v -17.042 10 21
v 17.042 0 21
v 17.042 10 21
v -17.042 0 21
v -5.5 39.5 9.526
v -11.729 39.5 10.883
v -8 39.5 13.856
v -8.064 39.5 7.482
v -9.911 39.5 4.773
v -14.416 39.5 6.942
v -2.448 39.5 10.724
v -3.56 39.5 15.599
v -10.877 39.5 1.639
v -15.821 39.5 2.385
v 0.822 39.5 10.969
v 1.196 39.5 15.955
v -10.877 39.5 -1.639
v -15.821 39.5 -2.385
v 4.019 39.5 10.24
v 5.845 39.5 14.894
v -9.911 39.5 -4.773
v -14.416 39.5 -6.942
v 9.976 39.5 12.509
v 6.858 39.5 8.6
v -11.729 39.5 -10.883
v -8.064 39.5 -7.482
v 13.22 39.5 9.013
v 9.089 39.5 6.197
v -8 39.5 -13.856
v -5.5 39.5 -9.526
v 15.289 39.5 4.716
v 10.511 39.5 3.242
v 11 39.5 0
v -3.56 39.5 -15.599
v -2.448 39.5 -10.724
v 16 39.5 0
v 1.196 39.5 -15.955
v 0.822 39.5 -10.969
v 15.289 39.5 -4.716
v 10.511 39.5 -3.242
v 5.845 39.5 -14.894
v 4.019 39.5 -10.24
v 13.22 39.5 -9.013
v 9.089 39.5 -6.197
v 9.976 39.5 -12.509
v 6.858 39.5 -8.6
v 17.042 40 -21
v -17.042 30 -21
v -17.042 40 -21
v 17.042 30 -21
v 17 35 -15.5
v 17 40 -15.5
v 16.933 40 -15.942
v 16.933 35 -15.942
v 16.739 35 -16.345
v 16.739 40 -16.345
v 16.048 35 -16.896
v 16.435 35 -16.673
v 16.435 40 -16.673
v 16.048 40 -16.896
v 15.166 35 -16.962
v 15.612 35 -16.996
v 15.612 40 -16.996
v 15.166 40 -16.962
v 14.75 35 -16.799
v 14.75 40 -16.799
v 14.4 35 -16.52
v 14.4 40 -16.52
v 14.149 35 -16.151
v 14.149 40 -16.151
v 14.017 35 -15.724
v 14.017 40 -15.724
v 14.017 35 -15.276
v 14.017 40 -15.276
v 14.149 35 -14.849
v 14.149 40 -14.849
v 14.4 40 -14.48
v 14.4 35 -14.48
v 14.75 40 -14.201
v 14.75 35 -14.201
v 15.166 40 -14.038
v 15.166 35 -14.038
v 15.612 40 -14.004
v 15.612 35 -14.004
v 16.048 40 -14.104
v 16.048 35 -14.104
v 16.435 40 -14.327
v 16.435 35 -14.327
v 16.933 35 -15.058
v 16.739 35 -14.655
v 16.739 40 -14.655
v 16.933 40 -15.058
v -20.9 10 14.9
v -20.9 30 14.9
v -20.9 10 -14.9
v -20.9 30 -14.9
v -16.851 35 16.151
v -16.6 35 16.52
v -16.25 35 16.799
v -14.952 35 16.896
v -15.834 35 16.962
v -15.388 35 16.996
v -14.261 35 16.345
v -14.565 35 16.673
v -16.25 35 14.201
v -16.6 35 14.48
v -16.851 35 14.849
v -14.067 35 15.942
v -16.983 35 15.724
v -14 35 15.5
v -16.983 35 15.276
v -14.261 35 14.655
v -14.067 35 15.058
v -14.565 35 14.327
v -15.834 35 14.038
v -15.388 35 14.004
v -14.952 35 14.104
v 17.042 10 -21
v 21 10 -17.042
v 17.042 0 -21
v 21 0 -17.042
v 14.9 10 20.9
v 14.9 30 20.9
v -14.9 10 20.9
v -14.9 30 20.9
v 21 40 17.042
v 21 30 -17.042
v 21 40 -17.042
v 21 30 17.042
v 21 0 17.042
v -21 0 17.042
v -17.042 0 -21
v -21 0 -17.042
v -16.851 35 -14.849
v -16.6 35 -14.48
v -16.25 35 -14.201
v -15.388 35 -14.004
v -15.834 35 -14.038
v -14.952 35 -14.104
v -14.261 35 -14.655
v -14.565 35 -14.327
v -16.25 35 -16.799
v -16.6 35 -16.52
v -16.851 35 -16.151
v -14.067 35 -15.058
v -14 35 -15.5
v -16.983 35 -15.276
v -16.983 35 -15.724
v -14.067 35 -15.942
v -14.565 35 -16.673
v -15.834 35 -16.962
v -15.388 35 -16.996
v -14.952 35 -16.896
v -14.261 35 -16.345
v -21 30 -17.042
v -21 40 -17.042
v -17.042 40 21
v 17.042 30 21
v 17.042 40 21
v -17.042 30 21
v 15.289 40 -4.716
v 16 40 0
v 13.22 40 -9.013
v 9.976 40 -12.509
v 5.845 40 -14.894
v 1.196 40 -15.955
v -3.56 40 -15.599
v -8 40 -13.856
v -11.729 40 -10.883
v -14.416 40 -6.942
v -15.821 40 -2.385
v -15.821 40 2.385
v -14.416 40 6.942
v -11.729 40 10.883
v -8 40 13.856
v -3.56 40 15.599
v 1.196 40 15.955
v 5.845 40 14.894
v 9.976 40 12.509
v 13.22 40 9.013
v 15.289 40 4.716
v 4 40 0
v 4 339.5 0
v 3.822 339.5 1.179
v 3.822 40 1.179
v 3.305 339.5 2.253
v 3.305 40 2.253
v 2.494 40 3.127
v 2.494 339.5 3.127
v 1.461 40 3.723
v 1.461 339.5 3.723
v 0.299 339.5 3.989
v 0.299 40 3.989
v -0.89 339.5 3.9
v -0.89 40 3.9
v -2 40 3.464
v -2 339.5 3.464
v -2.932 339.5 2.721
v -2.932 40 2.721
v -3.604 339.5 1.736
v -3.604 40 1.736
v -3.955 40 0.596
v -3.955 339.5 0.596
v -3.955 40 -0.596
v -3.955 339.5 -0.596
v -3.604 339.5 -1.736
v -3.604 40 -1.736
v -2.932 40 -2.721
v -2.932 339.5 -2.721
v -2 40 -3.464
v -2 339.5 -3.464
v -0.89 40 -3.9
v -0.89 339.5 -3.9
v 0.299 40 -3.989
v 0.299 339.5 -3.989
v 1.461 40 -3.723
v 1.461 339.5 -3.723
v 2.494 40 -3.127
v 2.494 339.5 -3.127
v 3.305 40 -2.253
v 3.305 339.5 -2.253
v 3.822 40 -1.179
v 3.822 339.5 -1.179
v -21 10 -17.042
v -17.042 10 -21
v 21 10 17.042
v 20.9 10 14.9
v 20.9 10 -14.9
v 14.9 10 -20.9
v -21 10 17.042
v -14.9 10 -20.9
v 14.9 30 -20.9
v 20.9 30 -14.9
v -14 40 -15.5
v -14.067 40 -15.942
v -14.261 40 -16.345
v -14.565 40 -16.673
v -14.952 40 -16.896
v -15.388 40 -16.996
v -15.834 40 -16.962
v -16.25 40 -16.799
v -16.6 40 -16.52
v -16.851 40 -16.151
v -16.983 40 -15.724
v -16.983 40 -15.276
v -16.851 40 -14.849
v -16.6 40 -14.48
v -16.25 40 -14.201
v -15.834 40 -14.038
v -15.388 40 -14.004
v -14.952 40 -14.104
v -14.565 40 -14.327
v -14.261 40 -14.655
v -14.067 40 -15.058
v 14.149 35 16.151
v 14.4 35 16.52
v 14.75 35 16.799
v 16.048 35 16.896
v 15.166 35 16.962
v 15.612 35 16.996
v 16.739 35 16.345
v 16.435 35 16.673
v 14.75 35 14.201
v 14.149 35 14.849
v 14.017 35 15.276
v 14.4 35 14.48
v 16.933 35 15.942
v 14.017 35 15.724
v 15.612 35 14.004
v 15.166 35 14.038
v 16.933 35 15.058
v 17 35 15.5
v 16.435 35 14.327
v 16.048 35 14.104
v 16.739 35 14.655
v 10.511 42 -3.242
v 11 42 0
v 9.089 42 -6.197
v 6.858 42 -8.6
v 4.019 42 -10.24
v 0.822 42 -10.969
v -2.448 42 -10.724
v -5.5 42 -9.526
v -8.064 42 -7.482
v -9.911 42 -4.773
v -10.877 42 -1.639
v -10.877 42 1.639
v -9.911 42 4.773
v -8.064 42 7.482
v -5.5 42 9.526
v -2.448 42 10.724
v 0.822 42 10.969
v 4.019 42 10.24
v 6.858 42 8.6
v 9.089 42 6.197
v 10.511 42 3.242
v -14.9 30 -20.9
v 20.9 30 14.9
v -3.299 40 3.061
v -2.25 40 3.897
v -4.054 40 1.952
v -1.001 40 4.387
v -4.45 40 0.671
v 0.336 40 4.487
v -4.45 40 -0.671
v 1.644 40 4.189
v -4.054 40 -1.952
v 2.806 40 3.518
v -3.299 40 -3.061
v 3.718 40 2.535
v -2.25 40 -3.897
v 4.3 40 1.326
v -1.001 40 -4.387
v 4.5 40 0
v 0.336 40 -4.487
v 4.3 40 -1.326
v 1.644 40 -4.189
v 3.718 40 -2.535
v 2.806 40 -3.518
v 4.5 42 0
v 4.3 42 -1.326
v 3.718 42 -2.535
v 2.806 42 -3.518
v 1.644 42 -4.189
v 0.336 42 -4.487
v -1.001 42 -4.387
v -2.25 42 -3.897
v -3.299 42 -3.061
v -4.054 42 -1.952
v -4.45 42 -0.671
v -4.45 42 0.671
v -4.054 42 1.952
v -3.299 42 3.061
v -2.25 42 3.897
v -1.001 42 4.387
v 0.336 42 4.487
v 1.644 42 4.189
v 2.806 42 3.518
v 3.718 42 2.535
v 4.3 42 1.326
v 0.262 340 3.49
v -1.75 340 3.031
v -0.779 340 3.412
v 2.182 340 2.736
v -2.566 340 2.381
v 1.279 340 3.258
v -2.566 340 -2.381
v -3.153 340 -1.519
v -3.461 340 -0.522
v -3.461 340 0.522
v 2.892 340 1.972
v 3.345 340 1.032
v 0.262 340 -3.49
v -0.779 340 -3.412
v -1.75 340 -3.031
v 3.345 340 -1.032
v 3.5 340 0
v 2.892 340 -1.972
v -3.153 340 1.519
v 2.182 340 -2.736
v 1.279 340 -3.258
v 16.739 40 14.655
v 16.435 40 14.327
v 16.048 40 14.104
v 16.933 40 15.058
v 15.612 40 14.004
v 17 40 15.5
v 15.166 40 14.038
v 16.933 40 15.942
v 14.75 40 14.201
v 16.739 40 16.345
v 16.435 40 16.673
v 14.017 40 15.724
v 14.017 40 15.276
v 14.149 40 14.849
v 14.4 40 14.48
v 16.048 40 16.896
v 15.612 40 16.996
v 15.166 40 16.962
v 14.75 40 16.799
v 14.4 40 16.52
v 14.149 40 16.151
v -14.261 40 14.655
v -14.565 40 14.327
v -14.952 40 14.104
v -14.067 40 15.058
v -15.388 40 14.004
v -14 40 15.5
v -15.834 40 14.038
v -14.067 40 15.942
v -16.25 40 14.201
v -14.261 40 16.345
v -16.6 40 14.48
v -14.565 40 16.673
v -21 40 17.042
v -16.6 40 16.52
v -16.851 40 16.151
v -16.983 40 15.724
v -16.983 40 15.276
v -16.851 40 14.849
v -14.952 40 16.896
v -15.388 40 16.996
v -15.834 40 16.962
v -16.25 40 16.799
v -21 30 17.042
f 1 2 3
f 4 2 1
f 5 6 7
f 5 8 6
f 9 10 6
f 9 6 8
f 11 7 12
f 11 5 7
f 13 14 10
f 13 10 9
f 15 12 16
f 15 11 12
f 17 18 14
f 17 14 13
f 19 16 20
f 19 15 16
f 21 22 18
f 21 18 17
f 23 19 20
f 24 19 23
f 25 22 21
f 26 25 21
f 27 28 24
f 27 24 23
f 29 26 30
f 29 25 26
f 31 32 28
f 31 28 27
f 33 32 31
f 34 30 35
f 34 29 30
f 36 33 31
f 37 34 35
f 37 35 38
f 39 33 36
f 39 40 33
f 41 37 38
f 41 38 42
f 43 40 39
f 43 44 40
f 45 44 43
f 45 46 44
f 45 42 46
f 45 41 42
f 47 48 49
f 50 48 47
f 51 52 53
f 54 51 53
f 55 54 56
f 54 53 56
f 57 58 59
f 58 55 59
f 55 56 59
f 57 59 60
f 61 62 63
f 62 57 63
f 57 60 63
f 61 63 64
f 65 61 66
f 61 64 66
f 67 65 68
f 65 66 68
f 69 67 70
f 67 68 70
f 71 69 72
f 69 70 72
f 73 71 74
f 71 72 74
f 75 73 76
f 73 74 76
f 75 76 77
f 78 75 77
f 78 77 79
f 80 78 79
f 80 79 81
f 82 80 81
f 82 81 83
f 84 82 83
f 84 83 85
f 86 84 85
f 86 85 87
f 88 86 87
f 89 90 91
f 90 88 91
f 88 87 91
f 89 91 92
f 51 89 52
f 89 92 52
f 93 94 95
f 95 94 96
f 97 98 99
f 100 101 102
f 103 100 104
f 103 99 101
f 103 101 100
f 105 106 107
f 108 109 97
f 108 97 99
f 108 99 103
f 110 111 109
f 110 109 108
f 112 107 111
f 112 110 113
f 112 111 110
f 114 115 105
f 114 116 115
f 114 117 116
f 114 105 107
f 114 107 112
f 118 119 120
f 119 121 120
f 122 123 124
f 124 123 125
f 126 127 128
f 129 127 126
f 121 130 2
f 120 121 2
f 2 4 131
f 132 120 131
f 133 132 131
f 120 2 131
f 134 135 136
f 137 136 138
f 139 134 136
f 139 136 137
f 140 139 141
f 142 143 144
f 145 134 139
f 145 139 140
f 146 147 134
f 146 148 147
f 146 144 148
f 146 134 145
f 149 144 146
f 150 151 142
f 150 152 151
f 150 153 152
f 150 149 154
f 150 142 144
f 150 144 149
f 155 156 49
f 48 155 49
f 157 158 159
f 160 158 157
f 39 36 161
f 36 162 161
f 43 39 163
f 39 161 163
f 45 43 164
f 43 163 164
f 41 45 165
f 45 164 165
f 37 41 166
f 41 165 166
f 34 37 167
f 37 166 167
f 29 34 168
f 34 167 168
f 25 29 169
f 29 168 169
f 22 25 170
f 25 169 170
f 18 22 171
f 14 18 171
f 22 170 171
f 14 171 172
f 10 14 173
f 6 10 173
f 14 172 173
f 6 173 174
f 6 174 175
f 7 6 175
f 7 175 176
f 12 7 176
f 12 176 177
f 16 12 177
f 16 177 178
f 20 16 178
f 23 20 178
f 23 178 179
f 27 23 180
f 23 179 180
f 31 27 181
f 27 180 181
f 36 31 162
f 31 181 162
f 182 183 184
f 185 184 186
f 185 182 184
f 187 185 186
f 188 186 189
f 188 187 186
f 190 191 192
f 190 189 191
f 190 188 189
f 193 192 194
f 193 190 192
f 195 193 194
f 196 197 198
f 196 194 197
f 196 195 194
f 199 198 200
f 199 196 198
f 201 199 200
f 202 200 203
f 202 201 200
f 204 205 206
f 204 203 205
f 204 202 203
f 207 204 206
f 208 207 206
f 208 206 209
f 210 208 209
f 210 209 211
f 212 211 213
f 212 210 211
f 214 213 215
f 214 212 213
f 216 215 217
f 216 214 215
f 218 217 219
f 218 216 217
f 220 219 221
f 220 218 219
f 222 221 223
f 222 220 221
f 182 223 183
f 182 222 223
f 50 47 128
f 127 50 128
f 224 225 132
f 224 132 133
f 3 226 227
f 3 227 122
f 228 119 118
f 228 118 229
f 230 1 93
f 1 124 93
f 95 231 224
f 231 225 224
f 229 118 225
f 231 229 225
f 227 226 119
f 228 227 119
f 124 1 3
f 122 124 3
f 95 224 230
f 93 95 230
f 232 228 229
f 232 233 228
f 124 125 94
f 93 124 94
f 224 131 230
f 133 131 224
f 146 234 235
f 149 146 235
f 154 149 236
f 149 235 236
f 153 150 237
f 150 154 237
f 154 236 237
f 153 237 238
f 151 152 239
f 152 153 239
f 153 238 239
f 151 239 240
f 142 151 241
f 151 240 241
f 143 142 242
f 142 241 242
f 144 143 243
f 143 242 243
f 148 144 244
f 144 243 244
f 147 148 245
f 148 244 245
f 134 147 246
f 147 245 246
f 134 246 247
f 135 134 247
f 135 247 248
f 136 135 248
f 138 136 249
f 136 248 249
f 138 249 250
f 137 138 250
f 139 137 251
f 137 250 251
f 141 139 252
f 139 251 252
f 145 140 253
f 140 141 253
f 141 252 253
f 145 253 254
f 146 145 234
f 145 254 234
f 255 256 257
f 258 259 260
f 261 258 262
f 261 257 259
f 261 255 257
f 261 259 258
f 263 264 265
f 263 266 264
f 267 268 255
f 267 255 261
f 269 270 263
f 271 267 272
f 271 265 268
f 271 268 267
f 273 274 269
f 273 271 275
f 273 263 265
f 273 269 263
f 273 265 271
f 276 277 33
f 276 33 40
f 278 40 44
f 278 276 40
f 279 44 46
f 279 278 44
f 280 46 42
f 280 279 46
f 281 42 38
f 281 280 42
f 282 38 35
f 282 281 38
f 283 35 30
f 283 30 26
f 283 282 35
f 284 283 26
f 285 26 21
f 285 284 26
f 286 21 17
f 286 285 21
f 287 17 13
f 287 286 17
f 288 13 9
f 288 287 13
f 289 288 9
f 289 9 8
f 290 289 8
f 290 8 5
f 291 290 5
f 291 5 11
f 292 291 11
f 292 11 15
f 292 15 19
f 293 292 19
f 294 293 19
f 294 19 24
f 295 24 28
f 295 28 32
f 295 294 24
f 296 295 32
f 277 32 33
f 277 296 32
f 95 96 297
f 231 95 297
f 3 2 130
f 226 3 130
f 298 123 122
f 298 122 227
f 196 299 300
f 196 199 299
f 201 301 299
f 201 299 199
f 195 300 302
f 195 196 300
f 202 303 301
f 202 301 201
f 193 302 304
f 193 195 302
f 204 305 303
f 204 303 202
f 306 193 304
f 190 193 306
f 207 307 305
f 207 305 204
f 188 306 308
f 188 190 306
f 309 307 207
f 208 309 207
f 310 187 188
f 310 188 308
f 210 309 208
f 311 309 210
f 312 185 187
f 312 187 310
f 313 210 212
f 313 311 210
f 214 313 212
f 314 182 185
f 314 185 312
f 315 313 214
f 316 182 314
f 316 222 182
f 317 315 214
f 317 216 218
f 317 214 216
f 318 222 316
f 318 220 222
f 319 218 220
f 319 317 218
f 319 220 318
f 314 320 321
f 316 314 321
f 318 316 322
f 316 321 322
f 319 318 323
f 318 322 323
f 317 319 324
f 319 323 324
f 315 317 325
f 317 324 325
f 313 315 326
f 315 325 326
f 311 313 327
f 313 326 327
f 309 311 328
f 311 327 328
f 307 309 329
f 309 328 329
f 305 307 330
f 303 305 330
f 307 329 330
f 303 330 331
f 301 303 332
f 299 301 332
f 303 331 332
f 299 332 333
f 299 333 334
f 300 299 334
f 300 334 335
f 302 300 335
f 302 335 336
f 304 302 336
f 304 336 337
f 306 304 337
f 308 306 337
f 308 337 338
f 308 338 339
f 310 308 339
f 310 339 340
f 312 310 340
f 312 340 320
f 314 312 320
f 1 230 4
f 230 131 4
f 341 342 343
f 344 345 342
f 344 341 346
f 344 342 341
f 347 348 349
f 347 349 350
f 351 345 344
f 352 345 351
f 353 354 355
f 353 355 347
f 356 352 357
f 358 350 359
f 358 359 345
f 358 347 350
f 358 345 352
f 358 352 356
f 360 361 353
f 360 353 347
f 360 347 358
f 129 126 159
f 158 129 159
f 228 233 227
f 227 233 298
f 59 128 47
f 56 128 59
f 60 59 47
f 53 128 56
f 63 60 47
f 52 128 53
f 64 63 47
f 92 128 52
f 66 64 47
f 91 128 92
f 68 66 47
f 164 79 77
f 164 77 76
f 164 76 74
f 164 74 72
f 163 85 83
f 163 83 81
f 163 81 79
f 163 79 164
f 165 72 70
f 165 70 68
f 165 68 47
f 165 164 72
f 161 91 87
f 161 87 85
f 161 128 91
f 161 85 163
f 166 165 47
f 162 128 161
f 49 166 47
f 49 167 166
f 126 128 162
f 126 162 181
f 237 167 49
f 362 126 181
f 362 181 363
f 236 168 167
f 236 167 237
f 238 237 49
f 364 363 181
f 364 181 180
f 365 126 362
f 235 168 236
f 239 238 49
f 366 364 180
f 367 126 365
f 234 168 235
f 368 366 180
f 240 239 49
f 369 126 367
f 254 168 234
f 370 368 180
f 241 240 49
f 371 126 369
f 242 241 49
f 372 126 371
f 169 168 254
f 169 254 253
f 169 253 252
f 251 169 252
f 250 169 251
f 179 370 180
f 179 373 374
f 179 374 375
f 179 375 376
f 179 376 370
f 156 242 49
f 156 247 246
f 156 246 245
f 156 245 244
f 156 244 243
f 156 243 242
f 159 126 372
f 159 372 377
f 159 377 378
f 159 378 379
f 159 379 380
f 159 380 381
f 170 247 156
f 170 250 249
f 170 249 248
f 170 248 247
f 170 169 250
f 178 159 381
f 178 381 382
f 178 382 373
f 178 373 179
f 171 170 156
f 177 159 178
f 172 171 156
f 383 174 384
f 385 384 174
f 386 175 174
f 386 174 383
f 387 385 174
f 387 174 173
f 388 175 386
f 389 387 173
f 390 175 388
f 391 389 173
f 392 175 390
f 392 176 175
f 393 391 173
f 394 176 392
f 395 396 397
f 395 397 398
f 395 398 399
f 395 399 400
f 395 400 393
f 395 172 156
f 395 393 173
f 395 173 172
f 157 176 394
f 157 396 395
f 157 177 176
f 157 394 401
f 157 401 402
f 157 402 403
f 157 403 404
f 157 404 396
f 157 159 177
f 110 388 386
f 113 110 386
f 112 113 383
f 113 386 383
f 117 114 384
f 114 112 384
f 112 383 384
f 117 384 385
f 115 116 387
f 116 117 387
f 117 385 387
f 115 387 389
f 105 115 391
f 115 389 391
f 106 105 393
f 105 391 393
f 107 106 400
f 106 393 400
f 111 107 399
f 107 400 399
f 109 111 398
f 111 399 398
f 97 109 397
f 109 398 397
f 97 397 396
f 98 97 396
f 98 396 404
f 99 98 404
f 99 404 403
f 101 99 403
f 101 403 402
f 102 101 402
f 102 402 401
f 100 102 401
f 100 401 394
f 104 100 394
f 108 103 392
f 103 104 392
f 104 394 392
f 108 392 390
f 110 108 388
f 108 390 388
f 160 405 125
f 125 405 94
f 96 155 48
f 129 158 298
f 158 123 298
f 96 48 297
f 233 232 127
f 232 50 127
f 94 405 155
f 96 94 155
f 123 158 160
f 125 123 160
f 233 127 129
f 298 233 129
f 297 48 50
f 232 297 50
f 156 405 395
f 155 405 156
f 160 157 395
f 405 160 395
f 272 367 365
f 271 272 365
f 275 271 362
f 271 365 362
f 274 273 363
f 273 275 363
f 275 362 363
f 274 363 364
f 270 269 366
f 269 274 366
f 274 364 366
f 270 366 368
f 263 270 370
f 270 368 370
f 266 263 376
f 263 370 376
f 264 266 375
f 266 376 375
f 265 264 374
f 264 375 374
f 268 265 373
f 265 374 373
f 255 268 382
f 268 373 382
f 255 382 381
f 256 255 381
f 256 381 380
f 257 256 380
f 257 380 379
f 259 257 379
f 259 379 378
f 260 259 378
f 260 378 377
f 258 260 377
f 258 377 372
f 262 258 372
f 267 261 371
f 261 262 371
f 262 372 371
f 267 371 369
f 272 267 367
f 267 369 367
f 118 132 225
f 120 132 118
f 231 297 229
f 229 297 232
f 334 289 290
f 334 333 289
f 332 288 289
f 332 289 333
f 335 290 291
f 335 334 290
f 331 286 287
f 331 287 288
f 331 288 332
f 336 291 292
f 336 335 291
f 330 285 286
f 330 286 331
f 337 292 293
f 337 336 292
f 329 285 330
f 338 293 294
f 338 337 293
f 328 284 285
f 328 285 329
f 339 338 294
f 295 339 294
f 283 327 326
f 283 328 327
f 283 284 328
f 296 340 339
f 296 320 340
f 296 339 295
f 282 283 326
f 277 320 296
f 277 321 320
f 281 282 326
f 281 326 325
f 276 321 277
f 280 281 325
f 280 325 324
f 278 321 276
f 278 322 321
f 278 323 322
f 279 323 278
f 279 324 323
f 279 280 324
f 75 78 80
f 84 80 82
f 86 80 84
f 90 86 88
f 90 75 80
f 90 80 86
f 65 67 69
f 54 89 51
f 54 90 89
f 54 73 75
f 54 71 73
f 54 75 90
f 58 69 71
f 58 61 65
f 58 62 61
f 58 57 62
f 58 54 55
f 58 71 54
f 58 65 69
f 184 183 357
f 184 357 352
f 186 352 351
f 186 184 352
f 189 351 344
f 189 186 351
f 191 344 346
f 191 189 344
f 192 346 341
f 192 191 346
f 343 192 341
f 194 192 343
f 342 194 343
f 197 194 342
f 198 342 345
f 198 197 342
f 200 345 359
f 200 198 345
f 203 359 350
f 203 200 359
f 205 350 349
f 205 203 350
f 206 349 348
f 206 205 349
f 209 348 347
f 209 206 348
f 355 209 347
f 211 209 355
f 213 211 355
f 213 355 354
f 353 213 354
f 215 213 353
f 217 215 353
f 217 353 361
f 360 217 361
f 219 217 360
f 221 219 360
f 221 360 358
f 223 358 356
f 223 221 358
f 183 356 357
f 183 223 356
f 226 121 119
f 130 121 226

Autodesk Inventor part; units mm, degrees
ref_plane "YZ Plane" through (0, 0, 0) normal (1, 0, 0) x (0, 1, 0)
ref_plane "XZ Plane" through (0, 0, 0) normal (0, 1, 0) x (-1, 0, 0)
sketch "Sketch1" plane through (0, 0, 0) normal (0, 1, 0) x (-1, 0, 0)
  line L0 (-21, 21) -> (21, 21)
  line L1 (21, 21) -> (21, -21)
  line L2 (21, -21) -> (-21, -21)
  line L3 (-21, -21) -> (-21, 21)
  line L4 (-21, 21) -> (21, -21) construction
  line L5 (21, 21) -> (-21, -21) construction
  point P0 (0, 0)
  dimension "d0" = 42
  dimension "d1" = 42
extrude "Extrusion1" add sketch "Sketch1" along normal blind 40
ref_plane "Work Plane1" through (0, 20, 0) normal (0, 1, 0) x (1, 0, 0)
sketch "Sketch2" plane through (0, 40, 0) normal (0, 1, 0) x (1, 0, 0)
  line L0 (0, -38.0423) -> (-38.0423, 0)
  line L1 (-38.0423, 0) -> (0, 38.0423)
  line L2 (0, 38.0423) -> (38.0423, 0)
  line L3 (38.0423, 0) -> (0, -38.0423)
  line L4 (0, -38.0423) -> (0, 38.0423) construction
  line L5 (-38.0423, 0) -> (38.0423, 0) construction
  line L6 (-21, 21) -> (-21, -21) projected
  circle A0 centre (0, 0) radius 250
  dimension "d4" = 53.8
  dimension "d5" = 53.8
  dimension "d6" = 500
extrude "Extrusion2" cut sketch "Sketch2" against normal blind 10
sketch "Sketch3" plane through (0, 20, 0) normal (0, 1, 0) x (1, 0, 0)
  line L0 (-20.9, -20.9) -> (20.9, -20.9)
  line L1 (20.9, -20.9) -> (20.9, 20.9)
  line L2 (20.9, 20.9) -> (-20.9, 20.9)
  line L3 (-20.9, 20.9) -> (-20.9, -20.9)
  line L4 (-21, -21) -> (-21, -17.0423) projected
  line L5 (21, -21) -> (17.0423, -21) projected
  line L6 (21, 21) -> (21, 17.0423) projected
  line L7 (-21, 21) -> (-17.0423, 21) projected
  circle A0 centre (0, 0) radius 200
  dimension "d9" = 0.1
  dimension "d10" = 0.1
  dimension "d11" = 0.1
  dimension "d12" = 0.1
  dimension "d13" = 400
extrude "Extrusion3" cut sketch "Sketch3" along normal up to surface (10 mm away)
chamfer "Chamfer1" distance 6 angle 45 4 edges at (20.9, 25, 20.9) (20.9, 25, -20.9) (-20.9, 25, 20.9) (-20.9, 25, -20.9)
mirror "Mirror1" about plane through (0, 20, 0) normal (0, 1, 0) of "Extrusion3", "Extrusion2", "Chamfer1"
sketch "Sketch4" plane through (0, 40, 0) normal (0, 1, 0) x (1, 0, 0)
  circle A0 centre (0, 0) radius 11
  dimension "d19" = 22
extrude "Extrusion4" add sketch "Sketch4" along normal blind 2
sketch "Sketch5" plane through (0, 40, 0) normal (0, 1, 0) x (1, 0, 0)
  circle A0 centre (0, 0) radius 11 projected
  line L0 (17.0423, -21) -> (21, -17.0423) projected
  line L1 (21, -17.0423) -> (21, 17.0423) projected
  line L2 (21, 17.0423) -> (17.0423, 21) projected
  line L3 (17.0423, 21) -> (-17.0423, 21) projected
  line L4 (-17.0423, 21) -> (-21, 17.0423) projected
  line L5 (-21, 17.0423) -> (-21, -17.0423) projected
  line L6 (-21, -17.0423) -> (-17.0423, -21) projected
  line L7 (-17.0423, -21) -> (17.0423, -21) projected
  circle A1 centre (0, 0) radius 16
  dimension "d22" = 32
extrude "Extrusion5" cut sketch "Sketch5" against normal blind 0.5 contours A1
sketch "Sketch6" plane through (0, 42, 0) normal (0, 1, 0) x (1, 0, 0)
  circle A0 centre (0, 0) radius 4.5
  dimension "d25" = 9
extrude "Extrusion6" cut sketch "Sketch6" against normal blind 2
sketch "Sketch7" plane through (0, 40, 0) normal (0, 1, 0) x (1, 0, 0)
  circle A0 centre (0, 0) radius 4
  dimension "d28" = 8
extrude "Extrusion7" add sketch "Sketch7" along normal blind 300
thread "Thread1" size "TR8x1.5" class "7e" standard "ISO Metric Trapezoidal Threads" full length
chamfer "Chamfer2" distance 0.5 angle 45 1 edges at (-4, 340, 0)
sketch "Sketch8" plane through (0, 40, 0) normal (0, 1, 0) x (1, 0, 0)
  circle A0 centre (0, 0) radius 16 construction
  line L0 (17.0423, -21) -> (21, -17.0423) construction
  line L1 (21, -17.0423) -> (21, 17.0423) construction
  line L2 (21, 17.0423) -> (17.0423, 21) construction
  line L3 (17.0423, 21) -> (-17.0423, 21) construction
  line L4 (-17.0423, 21) -> (-21, 17.0423) construction
  line L5 (-21, 17.0423) -> (-21, -17.0423) construction
  line L6 (-21, -17.0423) -> (-17.0423, -21) construction
  line L7 (-17.0423, -21) -> (17.0423, -21) construction
  line L8 (-15.5, -15.5) -> (15.5, -15.5) construction
  line L9 (15.5, -15.5) -> (15.5, 15.5) construction
  line L10 (15.5, 15.5) -> (-15.5, 15.5) construction
  line L11 (-15.5, 15.5) -> (-15.5, -15.5) construction
  line L12 (-15.5, -15.5) -> (15.5, 15.5) construction
  line L13 (15.5, -15.5) -> (-15.5, 15.5) construction
  circle A1 centre (-15.5, 15.5) radius 1.5
  circle A2 centre (15.5, 15.5) radius 1.5
  circle A3 centre (15.5, -15.5) radius 1.5
  circle A4 centre (-15.5, -15.5) radius 1.5
  dimension "d36" = 31
  dimension "d37" = 31
  dimension "d38" = 3
  dimension "d39" = 3
  dimension "d40" = 3
  dimension "d41" = 3
extrude "Extrusion8" cut sketch "Sketch8" against normal blind 5
thread "Thread2" size "M3x0.5" class "6H" standard "ANSI Metric M Profile" full length
pattern_circular "Circular Pattern1" count 4 over 360 about axis through (0, 40, 0) along (0, 1, 0) of "Extrusion8"
equation "\"d9\" = d10"
equation "\"d11\" = d10"
equation "\"d12\" = d10"
properties part number "linear_stepper_350mm"
